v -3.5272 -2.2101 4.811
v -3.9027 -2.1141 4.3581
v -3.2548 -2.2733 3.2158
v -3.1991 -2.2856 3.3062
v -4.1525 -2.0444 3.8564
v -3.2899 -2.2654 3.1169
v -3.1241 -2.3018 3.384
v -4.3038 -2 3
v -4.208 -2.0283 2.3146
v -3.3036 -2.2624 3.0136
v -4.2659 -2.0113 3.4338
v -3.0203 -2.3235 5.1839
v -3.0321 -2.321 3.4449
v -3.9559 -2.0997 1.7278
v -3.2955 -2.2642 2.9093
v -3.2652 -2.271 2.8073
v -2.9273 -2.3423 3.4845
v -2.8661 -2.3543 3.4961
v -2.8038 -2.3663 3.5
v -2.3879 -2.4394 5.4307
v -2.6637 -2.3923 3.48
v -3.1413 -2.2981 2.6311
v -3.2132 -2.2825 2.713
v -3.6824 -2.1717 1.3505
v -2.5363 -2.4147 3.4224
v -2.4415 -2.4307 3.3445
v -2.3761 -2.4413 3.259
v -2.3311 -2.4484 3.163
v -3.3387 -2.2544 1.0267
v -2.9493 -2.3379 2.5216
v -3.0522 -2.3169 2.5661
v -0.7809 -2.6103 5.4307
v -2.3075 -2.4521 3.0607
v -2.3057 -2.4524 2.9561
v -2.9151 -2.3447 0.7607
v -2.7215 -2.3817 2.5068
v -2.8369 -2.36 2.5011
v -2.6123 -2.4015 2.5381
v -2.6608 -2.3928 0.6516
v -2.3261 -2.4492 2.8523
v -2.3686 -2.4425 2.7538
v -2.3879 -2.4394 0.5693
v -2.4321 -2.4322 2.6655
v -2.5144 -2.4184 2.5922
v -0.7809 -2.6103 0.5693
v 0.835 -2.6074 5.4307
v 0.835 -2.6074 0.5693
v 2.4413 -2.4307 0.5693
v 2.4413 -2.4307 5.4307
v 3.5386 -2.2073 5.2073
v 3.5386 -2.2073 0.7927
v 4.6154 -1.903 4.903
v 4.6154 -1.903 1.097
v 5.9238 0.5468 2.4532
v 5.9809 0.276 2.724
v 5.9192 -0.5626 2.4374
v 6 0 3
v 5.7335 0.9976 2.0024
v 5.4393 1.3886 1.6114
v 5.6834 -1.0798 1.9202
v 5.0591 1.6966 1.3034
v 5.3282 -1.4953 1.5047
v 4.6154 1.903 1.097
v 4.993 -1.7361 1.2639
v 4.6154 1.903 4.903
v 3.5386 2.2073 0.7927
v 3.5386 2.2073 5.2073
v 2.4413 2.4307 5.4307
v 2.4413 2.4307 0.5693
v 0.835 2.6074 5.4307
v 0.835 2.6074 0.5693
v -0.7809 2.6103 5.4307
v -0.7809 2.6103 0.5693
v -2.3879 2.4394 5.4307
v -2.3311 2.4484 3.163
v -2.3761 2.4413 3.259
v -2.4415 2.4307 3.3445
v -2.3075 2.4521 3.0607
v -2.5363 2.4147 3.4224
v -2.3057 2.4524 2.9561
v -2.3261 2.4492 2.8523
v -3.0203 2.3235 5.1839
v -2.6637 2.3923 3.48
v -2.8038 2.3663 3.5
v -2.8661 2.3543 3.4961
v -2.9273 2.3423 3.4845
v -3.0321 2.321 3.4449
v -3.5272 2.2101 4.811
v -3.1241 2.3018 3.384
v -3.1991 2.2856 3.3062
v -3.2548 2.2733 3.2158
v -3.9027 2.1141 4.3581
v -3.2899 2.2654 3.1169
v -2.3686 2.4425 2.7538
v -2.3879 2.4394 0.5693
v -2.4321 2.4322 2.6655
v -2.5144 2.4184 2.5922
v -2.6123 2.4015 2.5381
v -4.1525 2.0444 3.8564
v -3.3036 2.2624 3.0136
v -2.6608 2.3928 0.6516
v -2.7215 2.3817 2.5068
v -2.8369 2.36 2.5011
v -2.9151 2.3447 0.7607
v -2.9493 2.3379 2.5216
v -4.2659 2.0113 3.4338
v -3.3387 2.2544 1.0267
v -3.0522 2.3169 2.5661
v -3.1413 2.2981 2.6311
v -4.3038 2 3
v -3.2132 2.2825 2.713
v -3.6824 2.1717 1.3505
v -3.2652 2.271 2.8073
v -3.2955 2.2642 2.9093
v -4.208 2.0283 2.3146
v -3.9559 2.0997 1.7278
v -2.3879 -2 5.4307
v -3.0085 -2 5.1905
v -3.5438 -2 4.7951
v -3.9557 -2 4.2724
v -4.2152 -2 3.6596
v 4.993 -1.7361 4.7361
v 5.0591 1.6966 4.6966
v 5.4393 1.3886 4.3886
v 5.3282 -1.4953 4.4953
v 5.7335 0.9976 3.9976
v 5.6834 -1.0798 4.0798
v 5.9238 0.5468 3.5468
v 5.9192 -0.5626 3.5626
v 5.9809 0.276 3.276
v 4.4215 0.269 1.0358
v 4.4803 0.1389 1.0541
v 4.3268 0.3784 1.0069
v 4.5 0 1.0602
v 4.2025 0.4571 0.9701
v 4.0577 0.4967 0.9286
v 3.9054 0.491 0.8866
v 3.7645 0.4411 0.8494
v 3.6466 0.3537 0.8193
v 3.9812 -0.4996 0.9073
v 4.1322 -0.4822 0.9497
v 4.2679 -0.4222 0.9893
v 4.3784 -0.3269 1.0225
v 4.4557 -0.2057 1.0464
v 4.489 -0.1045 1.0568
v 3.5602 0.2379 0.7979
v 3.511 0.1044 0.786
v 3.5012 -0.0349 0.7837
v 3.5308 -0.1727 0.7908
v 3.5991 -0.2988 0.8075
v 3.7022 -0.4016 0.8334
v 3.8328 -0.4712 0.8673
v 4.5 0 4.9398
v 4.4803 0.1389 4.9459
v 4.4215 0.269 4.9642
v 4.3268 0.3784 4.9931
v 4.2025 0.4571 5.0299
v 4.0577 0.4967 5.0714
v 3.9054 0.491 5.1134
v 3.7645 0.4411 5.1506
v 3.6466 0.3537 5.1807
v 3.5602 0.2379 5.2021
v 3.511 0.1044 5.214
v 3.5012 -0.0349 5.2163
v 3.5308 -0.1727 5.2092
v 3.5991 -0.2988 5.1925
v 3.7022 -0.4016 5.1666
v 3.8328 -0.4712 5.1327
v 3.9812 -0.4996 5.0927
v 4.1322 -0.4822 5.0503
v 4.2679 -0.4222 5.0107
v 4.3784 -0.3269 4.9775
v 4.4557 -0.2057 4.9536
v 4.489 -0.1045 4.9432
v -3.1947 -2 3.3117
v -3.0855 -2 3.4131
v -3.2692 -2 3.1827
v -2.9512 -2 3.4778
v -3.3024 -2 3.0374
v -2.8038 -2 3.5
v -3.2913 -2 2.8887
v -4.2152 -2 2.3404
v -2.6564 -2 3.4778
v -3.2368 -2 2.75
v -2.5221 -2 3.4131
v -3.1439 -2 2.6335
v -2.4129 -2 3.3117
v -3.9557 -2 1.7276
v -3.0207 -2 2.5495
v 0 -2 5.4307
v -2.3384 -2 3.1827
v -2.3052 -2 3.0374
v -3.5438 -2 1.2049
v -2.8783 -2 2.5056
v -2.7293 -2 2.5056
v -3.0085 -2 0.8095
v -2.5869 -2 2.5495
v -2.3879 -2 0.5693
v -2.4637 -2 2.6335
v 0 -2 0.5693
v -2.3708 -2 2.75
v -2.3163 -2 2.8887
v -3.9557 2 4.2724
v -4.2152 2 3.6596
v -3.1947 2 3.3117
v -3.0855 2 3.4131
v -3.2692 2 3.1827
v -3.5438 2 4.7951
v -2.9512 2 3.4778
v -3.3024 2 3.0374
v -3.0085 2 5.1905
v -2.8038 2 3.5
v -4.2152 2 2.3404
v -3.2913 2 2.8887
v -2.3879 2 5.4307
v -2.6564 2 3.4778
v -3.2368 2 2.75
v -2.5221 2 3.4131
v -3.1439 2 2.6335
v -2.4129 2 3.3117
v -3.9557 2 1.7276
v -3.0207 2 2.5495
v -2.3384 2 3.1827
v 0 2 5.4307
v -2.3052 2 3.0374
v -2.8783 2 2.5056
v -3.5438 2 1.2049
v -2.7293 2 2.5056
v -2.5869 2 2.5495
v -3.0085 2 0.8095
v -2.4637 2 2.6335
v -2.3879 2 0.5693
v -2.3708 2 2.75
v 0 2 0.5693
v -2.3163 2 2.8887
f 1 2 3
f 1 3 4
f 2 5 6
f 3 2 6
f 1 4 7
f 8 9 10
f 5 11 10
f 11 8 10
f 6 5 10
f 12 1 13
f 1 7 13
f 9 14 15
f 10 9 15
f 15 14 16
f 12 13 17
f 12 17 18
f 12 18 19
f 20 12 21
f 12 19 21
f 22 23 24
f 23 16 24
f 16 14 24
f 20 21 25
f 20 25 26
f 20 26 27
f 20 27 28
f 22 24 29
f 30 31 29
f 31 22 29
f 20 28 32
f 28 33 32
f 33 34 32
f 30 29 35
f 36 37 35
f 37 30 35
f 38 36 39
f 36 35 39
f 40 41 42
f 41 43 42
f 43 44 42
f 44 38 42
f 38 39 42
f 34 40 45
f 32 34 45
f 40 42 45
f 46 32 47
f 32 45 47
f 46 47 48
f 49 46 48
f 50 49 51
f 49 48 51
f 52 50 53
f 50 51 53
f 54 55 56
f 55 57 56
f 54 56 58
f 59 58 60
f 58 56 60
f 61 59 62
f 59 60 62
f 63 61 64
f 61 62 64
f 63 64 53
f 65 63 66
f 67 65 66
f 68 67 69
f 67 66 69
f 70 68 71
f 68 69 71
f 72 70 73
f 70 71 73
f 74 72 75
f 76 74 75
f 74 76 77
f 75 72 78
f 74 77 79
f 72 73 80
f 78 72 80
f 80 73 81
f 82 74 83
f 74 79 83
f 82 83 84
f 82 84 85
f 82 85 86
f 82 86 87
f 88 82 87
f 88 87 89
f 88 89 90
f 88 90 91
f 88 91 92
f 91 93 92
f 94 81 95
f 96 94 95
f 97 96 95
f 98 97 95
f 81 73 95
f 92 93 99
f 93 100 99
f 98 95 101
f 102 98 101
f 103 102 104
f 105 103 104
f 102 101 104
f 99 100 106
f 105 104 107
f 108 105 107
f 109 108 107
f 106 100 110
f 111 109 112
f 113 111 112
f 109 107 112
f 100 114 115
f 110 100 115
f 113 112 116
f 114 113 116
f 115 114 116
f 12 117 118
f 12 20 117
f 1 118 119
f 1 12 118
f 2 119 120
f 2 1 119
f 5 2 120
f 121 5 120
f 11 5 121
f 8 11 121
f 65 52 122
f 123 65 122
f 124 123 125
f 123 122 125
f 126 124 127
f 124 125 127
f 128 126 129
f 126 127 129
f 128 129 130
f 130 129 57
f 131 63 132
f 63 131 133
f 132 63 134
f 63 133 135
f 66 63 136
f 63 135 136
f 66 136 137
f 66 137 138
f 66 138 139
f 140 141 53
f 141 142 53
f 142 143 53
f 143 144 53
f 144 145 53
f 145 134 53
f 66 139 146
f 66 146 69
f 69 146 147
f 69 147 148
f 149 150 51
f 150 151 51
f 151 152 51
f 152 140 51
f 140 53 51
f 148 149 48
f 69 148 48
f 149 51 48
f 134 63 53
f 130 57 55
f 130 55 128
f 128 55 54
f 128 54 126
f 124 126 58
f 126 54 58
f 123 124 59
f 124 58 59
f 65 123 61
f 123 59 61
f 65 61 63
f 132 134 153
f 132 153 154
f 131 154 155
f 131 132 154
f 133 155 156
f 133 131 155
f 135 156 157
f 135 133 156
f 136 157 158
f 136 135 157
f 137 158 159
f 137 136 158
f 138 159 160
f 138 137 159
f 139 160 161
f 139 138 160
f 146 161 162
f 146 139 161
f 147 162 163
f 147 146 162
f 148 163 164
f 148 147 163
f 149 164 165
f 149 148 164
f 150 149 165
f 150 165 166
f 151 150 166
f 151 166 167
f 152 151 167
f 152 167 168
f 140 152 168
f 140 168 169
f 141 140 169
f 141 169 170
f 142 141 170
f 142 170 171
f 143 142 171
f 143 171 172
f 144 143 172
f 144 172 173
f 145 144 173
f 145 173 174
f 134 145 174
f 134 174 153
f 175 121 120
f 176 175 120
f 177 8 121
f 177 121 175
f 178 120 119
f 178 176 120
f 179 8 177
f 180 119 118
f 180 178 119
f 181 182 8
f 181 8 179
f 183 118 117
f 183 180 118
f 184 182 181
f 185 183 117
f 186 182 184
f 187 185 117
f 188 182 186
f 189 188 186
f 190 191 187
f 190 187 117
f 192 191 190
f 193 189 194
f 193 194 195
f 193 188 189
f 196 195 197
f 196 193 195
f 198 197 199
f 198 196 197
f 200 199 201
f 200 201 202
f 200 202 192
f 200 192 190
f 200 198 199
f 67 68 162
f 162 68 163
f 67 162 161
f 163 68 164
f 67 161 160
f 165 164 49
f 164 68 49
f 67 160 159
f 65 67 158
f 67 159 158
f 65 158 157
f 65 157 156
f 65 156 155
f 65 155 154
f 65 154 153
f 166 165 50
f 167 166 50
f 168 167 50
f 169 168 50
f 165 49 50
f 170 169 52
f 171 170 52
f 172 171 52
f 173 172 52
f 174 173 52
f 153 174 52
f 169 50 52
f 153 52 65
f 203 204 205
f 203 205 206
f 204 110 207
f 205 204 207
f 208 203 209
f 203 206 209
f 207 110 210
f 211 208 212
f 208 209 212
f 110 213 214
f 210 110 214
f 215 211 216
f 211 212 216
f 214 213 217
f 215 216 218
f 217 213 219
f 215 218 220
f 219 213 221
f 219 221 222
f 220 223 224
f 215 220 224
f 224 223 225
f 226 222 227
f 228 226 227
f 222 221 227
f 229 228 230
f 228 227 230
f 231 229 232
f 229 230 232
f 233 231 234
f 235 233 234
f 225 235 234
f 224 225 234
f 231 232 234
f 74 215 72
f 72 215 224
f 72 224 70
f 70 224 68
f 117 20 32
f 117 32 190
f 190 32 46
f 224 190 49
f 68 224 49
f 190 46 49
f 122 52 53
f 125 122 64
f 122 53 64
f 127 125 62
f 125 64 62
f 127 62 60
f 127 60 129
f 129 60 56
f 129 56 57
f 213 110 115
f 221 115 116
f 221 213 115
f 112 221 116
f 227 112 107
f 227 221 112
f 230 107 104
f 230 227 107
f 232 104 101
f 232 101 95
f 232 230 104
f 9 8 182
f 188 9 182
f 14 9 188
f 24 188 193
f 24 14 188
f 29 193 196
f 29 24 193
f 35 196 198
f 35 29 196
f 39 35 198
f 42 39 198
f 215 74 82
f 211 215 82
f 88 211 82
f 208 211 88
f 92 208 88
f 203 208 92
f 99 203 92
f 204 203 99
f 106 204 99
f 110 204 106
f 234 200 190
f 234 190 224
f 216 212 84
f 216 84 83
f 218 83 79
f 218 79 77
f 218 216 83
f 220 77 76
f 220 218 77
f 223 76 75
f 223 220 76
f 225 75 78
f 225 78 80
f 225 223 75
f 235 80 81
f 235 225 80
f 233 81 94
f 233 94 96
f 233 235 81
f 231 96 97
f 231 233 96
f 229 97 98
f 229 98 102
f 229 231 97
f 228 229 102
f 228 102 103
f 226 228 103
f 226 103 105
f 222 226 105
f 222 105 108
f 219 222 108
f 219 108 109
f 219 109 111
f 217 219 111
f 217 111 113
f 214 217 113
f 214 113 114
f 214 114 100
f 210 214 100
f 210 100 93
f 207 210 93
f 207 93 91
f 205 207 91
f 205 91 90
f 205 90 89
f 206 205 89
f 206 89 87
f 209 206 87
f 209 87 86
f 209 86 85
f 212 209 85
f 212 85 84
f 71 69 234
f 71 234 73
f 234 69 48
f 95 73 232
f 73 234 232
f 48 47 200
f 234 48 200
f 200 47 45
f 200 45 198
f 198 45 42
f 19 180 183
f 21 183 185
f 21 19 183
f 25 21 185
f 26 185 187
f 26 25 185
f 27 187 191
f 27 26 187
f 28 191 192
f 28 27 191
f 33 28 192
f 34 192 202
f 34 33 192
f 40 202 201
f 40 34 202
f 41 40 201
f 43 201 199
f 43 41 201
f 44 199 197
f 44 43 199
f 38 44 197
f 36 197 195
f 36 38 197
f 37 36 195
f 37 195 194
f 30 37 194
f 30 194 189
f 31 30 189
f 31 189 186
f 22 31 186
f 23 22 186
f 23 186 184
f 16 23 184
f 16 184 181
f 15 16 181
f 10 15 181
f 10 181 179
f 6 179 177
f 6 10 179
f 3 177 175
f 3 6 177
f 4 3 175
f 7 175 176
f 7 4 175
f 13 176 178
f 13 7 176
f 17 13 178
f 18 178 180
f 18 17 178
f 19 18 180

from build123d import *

# Parameters (mm, degrees)
CROQUIS1_R                 = 0.5
SALIENTE_EXTRUIR1_DEPTH    = 6
CORTAR_EXTRUIR6_DEPTH      = 9.883720712
CORTAR_EXTRUIR6_DEPTH_BACK = 9.883720712
CROQUIS3_W                 = 6
CROQUIS3_H                 = 4
CORTAR_EXTRUIR2_DEPTH      = 9.509571903
CORTAR_EXTRUIR7_DEPTH      = 9.509571903
CORTAR_EXTRUIR7_DEPTH_BACK = 9.509571903
CORTAR_EXTRUIR1_DEPTH      = 9.509571933
CORTAR_EXTRUIR1_DEPTH_BACK = 9.509571933
CROQUIS2_R                 = 0.5


with BuildPart() as part:
    # Croquis1 → Saliente-Extruir1 (new body)
    with BuildSketch(Plane.XY):
        with BuildLine():
            ThreePointArc((-4.615384615, 1.902971827), (-6, 0), (-4.615384615, -1.902971827))
            ThreePointArc((-4.615384615, -1.902971827), (0, -2.630683123), (4.615384615, -1.902971827))
            ThreePointArc((4.615384615, -1.902971827), (6, 0), (4.615384615, 1.902971827))
            ThreePointArc((4.615384615, 1.902971827), (0, 2.630683123), (-4.615384615, 1.902971827))
        make_face()
        with Locations((4, 0)):
            Circle(CROQUIS1_R, mode=Mode.SUBTRACT)
    extrude(amount=SALIENTE_EXTRUIR1_DEPTH)

    # Croquis7 → Cortar-Extruir6 (cut, two sides: drawn at the far end of the back side and taken through both)
    with BuildSketch(Plane(origin=(0, 0, 0), x_dir=(1, 0, 0), z_dir=(0, 1, 0)).offset(-CORTAR_EXTRUIR6_DEPTH_BACK)):
        Polygon((-6, 0), (6, 0), (6, -3), (6, -6), (-6, -6), (-6, -3), align=None)
        with BuildLine():
            Line((-2.441311123, -5.430683123), (2.441311123, -5.430683123))
            ThreePointArc((2.441311123, -5.430683123), (3.538199894, -5.207416005), (4.615384615, -4.902971827))
            ThreePointArc((4.615384615, -4.902971827), (6, -3), (4.615384615, -1.097028173))
            ThreePointArc((4.615384615, -1.097028173), (3.538199894, -0.792583995), (2.441311123, -0.569316877))
            Line((2.441311123, -0.569316877), (-2.441311123, -0.569316877))
            ThreePointArc((-2.441311123, -0.569316877), (-3.538199894, -0.792583995), (-4.615384615, -1.097028173))
            ThreePointArc((-4.615384615, -1.097028173), (-6, -3), (-4.615384615, -4.902971827))
            ThreePointArc((-4.615384615, -4.902971827), (-3.538199894, -5.207416005), (-2.441311123, -5.430683123))
        make_face(mode=Mode.SUBTRACT)
    extrude(amount=CORTAR_EXTRUIR6_DEPTH + CORTAR_EXTRUIR6_DEPTH_BACK, mode=Mode.SUBTRACT)

    # Croquis3 → Cortar-Extruir2 (cut, through all)
    with BuildSketch(Plane.XY):
        with Locations((-3, 0)):
            Rectangle(CROQUIS3_W, CROQUIS3_H)
    extrude(amount=CORTAR_EXTRUIR2_DEPTH, mode=Mode.SUBTRACT)

    # Croquis4 → Cortar-Extruir7 (cut, two sides: drawn at the far end of the back side and taken through both)
    with BuildSketch(Plane(origin=(0, 0, 0), x_dir=(1, 0, 0), z_dir=(0, 1, 0)).offset(-CORTAR_EXTRUIR7_DEPTH_BACK)):
        with BuildLine():
            ThreePointArc((-2.164743401, -0.526342579), (-3.242933174, -0.724065618), (-4.303804421, -1))
            Line((-4.303804421, -1), (-4.303804421, -3))
            ThreePointArc((-4.303804421, -3), (-3.694875017, -1.364872858), (-2.164743401, -0.526342579))
        make_face()
        with BuildLine():
            ThreePointArc((-2.164743401, -5.473657421), (-3.694875017, -4.635127142), (-4.303804421, -3))
            Line((-4.303804421, -3), (-4.303804421, -5))
            ThreePointArc((-4.303804421, -5), (-3.242933174, -5.275934382), (-2.164743401, -5.473657421))
        make_face()
    extrude(amount=CORTAR_EXTRUIR7_DEPTH + CORTAR_EXTRUIR7_DEPTH_BACK, mode=Mode.SUBTRACT)

    # Croquis2 → Cortar-Extruir1 (cut, two sides: drawn at the far end of the back side and taken through both)
    with BuildSketch(Plane(origin=(0, 0, 0), x_dir=(1, 0, 0), z_dir=(0, 1, 0)).offset(-CORTAR_EXTRUIR1_DEPTH_BACK)):
        with Locations(Location((-2.803804421, -3, 0), (0, 0, 270))):
            Circle(CROQUIS2_R)
    extrude(amount=CORTAR_EXTRUIR1_DEPTH + CORTAR_EXTRUIR1_DEPTH_BACK, mode=Mode.SUBTRACT)


solid = part.part
